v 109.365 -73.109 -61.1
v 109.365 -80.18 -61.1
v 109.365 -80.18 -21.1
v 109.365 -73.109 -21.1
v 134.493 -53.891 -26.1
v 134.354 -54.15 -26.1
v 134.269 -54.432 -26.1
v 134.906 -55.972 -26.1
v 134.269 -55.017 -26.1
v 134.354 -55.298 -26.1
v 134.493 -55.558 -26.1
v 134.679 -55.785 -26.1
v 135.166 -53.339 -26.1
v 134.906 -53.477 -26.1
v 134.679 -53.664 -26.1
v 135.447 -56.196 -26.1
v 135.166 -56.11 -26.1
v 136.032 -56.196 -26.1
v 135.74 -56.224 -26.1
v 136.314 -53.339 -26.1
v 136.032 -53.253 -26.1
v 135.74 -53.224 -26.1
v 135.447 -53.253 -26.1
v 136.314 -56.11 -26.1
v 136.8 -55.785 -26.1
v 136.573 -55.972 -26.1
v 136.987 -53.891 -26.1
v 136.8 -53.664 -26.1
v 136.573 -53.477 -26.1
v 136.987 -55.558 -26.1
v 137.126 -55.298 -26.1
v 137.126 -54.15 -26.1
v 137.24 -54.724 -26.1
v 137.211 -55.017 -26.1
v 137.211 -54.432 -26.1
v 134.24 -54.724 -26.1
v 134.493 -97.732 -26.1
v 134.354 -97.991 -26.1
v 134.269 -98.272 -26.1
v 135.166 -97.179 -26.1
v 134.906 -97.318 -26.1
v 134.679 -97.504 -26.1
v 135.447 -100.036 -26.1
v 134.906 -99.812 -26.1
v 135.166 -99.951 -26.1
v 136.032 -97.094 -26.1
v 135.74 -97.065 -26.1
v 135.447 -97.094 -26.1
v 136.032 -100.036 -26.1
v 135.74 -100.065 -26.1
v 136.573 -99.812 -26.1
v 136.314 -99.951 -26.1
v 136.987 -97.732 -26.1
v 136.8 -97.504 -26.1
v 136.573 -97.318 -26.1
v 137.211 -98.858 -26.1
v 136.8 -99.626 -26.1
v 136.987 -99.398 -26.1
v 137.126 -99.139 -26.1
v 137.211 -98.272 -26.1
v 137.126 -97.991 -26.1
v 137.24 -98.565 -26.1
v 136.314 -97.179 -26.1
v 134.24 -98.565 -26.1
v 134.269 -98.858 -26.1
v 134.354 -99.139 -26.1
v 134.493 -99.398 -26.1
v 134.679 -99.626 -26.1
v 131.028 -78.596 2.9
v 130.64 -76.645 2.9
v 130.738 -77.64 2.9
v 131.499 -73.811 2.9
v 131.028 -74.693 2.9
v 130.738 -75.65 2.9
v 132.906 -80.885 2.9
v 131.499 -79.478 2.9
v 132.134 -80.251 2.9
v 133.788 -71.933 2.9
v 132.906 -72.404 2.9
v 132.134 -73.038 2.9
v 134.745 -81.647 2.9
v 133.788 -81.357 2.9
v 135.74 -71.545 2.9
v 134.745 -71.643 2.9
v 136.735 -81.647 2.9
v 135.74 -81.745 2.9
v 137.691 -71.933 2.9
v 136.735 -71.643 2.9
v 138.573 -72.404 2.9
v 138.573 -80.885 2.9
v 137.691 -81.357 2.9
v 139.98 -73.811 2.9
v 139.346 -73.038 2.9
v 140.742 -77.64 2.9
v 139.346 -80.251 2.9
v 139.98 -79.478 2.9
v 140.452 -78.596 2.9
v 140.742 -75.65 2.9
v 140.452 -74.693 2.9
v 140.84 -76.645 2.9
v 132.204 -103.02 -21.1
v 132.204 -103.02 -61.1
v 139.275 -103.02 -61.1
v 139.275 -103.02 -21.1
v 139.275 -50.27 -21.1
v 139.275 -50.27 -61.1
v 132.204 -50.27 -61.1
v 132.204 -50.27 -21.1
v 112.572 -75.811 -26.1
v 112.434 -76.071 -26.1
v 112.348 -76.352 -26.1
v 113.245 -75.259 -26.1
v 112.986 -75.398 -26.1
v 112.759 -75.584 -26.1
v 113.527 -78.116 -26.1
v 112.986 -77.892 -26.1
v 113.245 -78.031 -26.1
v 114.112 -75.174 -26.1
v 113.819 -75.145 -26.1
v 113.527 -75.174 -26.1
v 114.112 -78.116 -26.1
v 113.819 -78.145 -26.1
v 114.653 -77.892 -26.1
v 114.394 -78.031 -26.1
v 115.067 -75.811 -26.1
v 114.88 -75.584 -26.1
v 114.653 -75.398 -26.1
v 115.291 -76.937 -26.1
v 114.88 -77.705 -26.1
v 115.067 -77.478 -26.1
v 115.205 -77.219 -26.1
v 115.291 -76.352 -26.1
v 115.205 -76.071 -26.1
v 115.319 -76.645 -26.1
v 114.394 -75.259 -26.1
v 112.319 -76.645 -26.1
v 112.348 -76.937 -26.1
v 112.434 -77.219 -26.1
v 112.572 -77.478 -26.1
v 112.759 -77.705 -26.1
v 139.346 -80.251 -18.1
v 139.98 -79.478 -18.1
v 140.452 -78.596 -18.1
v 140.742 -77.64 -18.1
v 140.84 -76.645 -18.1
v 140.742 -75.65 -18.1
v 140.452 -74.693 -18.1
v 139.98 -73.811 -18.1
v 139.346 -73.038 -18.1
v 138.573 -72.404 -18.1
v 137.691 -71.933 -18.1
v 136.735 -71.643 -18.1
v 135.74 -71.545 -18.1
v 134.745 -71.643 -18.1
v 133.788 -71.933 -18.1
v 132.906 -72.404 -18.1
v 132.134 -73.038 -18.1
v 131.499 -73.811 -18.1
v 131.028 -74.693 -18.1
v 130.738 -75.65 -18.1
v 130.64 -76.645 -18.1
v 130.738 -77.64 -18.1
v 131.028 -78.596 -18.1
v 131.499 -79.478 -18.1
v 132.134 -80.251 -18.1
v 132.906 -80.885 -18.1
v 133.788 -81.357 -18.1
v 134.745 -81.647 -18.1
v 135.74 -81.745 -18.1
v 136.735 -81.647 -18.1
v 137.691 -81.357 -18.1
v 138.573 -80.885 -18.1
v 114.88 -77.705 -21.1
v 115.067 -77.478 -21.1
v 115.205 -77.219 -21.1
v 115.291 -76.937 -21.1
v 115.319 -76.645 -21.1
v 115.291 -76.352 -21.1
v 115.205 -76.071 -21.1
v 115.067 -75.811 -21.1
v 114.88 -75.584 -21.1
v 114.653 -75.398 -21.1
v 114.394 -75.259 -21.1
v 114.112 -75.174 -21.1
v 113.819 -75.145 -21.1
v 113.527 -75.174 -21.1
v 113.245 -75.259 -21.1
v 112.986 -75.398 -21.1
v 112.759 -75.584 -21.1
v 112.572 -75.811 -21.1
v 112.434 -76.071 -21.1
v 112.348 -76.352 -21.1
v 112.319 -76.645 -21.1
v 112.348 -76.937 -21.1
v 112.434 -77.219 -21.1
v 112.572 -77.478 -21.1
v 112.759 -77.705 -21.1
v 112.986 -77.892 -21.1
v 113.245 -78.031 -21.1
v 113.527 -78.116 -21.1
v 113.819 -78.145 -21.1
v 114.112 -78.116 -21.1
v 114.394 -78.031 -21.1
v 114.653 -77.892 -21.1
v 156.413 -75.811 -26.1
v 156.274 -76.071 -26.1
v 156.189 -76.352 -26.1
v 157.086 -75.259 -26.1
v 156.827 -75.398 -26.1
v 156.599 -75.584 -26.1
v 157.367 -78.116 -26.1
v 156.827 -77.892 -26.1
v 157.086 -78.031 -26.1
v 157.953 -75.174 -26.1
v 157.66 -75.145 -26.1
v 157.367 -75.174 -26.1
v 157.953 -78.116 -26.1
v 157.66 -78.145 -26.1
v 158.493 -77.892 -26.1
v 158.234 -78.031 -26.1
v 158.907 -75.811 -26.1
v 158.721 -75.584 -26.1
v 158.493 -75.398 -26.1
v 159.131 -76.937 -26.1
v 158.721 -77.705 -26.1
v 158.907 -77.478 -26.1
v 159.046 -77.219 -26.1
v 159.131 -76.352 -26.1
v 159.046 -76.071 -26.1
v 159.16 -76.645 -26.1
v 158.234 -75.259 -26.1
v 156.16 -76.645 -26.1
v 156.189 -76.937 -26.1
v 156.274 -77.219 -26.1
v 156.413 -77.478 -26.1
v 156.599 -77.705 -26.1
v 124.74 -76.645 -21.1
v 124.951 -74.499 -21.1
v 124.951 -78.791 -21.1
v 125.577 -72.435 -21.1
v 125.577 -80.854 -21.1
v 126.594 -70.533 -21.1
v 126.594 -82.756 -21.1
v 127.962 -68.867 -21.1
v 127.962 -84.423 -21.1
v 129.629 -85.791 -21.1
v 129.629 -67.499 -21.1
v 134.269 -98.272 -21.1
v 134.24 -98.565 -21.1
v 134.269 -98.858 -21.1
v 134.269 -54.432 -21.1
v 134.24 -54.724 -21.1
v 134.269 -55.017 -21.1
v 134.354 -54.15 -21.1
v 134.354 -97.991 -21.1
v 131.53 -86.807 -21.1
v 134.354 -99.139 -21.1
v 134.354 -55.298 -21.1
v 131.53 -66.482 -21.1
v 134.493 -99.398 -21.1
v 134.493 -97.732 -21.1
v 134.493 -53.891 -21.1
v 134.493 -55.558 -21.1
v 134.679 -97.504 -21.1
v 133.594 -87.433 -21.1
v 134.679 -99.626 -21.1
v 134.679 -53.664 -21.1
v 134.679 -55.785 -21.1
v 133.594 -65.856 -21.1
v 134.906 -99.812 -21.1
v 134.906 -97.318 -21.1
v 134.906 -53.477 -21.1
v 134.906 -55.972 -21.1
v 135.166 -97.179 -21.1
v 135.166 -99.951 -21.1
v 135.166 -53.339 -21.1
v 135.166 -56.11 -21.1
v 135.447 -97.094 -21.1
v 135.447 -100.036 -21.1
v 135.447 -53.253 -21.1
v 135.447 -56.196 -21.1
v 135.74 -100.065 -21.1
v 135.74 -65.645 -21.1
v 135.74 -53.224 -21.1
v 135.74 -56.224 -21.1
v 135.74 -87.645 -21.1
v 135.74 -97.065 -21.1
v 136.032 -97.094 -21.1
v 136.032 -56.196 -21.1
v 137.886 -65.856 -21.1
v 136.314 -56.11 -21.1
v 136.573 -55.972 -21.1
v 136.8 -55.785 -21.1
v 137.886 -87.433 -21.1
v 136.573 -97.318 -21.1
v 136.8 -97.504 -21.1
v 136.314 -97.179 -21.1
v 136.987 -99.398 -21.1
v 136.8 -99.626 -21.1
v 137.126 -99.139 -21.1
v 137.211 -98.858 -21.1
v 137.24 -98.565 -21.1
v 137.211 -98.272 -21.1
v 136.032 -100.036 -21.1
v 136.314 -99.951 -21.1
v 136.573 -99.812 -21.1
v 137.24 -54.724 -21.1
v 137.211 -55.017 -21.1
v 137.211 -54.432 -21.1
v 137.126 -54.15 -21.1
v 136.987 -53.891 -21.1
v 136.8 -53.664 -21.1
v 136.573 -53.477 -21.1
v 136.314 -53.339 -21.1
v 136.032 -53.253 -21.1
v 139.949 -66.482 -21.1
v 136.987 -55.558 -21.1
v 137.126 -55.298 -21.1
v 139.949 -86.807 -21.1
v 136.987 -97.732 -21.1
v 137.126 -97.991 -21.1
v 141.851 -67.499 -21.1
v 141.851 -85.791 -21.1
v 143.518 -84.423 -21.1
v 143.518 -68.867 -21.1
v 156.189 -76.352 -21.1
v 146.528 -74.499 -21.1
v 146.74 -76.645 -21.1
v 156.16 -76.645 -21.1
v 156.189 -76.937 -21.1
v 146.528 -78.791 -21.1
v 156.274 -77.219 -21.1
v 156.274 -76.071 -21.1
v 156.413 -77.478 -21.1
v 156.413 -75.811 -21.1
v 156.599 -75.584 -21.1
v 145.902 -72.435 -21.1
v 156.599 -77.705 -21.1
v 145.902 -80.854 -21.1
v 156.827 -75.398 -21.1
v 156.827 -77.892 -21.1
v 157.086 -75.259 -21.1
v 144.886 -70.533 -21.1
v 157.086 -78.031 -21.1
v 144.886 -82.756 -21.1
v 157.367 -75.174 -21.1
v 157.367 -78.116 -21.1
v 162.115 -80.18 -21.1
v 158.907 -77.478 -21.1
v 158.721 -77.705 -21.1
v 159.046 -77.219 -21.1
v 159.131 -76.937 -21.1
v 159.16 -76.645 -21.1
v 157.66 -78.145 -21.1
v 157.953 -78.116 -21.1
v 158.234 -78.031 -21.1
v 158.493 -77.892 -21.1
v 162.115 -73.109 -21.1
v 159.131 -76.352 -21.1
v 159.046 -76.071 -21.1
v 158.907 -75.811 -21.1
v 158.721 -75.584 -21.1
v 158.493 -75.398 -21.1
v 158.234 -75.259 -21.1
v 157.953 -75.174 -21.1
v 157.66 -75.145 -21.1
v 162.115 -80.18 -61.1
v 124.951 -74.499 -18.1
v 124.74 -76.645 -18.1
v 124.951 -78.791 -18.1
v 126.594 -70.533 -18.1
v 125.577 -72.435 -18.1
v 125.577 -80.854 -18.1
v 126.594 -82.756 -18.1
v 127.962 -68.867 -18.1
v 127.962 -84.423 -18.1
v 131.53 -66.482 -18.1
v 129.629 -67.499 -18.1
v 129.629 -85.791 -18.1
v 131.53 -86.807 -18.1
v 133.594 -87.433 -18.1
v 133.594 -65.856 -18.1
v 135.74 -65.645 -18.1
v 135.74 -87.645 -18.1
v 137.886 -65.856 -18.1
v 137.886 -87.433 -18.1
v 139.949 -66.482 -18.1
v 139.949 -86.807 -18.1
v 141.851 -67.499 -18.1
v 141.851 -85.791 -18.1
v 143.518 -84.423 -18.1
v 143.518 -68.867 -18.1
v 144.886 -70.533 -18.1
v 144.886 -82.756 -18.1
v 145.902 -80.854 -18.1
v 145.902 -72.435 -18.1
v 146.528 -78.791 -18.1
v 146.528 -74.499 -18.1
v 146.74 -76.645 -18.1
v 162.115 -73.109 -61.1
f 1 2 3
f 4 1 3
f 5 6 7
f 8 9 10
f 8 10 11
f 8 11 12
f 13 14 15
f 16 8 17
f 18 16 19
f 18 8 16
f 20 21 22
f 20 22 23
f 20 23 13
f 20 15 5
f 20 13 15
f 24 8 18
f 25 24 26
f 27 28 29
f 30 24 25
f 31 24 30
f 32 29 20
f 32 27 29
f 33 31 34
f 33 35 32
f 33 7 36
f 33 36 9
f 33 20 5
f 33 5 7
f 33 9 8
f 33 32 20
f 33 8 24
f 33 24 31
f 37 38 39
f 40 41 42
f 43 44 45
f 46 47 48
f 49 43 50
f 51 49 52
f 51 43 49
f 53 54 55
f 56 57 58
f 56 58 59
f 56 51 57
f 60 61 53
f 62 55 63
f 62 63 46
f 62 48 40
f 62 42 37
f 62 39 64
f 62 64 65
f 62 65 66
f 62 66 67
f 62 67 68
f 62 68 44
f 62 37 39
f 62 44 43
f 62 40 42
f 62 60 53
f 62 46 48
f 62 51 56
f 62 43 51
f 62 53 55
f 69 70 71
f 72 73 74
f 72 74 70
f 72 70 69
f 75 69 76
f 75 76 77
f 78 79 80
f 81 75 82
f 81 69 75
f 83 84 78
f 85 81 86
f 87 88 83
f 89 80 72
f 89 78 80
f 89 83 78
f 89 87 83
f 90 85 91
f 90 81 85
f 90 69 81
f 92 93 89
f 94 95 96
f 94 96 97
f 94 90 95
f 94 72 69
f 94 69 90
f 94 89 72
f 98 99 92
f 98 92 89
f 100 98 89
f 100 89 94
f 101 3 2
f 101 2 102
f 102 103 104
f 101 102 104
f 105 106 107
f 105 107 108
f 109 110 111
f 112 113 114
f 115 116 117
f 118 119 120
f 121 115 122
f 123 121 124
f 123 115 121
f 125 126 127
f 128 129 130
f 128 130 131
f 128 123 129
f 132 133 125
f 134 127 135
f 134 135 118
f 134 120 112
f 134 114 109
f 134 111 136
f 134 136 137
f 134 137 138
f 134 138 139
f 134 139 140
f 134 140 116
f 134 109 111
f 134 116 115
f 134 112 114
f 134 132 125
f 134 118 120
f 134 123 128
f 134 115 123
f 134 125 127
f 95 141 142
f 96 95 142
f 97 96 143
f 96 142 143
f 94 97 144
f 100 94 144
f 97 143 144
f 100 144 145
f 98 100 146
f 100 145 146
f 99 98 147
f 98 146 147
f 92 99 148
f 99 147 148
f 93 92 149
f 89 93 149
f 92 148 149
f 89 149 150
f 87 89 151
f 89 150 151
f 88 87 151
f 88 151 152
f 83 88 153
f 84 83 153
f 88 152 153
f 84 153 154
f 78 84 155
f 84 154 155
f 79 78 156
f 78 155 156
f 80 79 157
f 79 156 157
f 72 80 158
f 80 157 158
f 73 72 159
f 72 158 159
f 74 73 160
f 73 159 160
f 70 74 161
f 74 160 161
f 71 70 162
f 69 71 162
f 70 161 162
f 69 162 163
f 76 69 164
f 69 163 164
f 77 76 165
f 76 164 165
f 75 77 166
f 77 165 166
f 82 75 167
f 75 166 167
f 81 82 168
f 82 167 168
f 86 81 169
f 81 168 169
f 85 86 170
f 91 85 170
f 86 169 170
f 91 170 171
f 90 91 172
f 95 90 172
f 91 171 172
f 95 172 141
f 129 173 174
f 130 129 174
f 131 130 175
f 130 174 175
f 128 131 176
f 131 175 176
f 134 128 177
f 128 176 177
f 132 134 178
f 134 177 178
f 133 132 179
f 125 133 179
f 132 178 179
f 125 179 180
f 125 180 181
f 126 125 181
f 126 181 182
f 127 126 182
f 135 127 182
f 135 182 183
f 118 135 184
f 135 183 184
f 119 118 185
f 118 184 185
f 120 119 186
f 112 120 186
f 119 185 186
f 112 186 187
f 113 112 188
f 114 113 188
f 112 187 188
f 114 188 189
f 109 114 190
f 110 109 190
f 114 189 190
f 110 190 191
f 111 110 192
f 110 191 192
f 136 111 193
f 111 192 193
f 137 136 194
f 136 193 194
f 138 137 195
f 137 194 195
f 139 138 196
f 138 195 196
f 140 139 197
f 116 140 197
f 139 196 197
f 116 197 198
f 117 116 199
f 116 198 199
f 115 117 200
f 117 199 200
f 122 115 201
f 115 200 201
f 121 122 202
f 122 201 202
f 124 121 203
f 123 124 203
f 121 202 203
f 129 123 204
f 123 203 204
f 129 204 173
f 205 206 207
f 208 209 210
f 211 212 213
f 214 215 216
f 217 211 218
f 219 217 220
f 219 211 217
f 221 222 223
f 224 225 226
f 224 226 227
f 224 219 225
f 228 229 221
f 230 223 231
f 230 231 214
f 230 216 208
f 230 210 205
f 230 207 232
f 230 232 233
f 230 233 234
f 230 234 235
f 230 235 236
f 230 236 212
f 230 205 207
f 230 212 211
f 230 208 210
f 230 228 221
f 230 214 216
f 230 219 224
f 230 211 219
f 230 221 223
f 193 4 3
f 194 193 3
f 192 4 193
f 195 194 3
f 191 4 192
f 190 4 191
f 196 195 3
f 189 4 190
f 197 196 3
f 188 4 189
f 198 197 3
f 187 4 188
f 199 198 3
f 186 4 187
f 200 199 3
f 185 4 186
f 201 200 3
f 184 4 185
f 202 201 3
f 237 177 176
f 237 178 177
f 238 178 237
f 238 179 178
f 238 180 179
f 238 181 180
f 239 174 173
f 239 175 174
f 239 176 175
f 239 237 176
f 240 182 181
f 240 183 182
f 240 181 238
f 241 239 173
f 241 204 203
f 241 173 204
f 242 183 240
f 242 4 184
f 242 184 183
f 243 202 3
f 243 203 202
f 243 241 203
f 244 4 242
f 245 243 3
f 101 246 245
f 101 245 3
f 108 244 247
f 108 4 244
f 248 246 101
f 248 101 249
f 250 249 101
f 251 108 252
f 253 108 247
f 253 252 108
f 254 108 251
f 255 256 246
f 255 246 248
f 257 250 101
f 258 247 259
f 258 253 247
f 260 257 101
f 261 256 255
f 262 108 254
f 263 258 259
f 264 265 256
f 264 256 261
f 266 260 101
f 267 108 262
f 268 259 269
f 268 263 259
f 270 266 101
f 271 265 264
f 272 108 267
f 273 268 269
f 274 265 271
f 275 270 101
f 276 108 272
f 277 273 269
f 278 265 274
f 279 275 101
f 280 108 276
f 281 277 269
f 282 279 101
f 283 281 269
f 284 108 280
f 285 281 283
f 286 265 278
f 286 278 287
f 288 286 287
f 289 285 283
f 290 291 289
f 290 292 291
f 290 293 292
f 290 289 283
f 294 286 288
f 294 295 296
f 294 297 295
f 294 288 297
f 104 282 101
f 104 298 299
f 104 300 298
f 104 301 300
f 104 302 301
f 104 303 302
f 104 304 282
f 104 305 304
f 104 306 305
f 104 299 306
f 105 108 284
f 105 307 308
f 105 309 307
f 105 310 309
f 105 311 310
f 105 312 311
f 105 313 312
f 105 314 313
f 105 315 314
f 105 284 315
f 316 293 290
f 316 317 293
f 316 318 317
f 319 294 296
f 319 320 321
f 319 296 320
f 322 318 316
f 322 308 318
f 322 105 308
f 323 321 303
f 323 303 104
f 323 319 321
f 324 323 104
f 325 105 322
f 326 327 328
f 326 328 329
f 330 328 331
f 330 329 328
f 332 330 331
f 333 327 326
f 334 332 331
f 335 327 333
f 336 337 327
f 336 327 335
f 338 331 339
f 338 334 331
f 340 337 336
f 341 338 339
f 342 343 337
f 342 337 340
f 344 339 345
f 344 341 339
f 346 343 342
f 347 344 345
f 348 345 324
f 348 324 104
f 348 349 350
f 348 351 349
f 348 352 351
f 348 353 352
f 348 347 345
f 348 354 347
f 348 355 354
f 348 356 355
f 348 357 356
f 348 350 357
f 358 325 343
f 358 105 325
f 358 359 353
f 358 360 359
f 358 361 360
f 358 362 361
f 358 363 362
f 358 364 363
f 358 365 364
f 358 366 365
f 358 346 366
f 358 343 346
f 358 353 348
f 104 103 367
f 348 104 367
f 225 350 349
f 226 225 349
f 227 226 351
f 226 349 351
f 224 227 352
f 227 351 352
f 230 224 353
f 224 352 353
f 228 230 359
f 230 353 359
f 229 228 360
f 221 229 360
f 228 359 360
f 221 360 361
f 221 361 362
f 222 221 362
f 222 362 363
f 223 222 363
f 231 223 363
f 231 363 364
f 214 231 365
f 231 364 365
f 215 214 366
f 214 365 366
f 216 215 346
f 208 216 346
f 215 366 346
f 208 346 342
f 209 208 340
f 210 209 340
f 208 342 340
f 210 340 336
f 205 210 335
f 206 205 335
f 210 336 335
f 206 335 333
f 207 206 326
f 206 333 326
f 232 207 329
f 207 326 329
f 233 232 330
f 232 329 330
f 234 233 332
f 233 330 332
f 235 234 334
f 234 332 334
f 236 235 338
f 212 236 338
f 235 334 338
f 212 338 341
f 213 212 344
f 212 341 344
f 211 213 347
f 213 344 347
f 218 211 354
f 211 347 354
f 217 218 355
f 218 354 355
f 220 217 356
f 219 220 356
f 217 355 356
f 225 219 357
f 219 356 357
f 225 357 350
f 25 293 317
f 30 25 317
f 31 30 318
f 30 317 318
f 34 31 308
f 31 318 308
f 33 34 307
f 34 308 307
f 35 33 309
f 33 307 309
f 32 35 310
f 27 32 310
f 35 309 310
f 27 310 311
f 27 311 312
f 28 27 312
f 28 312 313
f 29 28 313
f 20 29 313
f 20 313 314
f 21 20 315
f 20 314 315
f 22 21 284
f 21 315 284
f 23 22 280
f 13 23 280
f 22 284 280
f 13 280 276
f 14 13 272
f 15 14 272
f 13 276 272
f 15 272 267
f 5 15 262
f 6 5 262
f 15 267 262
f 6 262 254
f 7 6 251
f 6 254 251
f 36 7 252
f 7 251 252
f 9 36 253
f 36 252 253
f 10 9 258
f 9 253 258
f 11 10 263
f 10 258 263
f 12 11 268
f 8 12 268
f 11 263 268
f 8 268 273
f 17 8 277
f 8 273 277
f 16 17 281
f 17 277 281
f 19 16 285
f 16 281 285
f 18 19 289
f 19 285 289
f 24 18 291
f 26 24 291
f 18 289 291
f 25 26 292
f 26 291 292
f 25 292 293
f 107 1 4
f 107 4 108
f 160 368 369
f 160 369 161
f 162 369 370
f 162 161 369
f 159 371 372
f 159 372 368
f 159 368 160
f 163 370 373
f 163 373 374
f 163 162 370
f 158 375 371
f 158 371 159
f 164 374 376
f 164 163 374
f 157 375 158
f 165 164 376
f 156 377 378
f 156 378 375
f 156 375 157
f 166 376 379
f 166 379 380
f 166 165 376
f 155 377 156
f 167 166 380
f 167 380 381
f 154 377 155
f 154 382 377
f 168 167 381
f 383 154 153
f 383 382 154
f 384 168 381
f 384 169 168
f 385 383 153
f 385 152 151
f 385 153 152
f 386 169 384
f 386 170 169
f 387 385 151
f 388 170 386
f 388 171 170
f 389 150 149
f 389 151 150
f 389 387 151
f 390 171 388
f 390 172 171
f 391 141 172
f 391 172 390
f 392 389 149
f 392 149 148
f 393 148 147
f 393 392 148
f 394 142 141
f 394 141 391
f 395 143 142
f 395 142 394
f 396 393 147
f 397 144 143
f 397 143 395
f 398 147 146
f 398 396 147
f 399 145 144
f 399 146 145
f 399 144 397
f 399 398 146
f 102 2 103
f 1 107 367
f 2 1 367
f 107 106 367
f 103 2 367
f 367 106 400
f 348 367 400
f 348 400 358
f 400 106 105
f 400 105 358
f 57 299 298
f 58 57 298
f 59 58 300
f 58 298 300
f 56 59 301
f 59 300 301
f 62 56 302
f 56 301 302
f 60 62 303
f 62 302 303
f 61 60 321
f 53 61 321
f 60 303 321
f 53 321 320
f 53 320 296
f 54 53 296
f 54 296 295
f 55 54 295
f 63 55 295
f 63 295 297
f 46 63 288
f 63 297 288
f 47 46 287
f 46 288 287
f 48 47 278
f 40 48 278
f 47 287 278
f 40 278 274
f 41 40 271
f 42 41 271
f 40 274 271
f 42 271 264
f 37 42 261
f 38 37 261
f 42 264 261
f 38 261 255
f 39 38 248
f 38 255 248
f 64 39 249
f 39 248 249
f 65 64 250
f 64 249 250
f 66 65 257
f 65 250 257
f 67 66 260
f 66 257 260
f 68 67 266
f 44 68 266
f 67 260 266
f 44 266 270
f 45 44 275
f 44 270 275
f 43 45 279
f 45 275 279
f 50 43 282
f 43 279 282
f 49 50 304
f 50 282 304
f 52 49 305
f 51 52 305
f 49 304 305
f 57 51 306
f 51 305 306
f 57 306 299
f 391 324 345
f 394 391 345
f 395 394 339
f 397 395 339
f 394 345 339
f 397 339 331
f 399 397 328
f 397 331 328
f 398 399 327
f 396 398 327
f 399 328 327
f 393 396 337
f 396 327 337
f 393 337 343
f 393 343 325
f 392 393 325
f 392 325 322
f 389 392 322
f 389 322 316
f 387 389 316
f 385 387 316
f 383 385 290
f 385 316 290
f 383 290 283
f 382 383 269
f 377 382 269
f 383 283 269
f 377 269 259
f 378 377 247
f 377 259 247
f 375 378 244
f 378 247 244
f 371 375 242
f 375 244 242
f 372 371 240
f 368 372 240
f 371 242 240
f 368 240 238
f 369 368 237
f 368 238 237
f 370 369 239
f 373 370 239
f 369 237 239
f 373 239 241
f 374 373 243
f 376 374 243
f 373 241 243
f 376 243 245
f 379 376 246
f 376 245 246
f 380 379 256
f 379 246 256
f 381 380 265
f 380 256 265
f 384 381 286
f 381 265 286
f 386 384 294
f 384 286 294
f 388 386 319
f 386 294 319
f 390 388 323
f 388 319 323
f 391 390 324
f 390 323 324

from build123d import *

# Parameters (mm, degrees)
SKETCH018_W             = 42.3
SKETCH018_H             = 42.3
PAD005_DEPTH            = 40
SKETCH019_R             = 11
PAD006_DEPTH            = 3
SKETCH020_R             = 5.1
PAD007_DEPTH            = 21
SKETCH022_R             = 1.5
POCKET011_DEPTH         = 5
CHAMFER001_SIZE         = 5
BODY006_PLACEMENT_ANGLE = 45


with BuildPart() as part:
    # Sketch018 → Pad005 (new body)
    with BuildSketch(Plane.XY):
        Rectangle(SKETCH018_W, SKETCH018_H)
    extrude(amount=PAD005_DEPTH)

    # Sketch019 (on Face6 of Pad005) → Pad006 (join)
    with BuildSketch(Plane.XY.offset(40)):
        Circle(SKETCH019_R)
    extrude(amount=PAD006_DEPTH)

    # Sketch020 (on Face8 of Pad006) → Pad007 (join)
    with BuildSketch(Plane.XY.offset(43)):
        Circle(SKETCH020_R)
    extrude(amount=PAD007_DEPTH)

    # Sketch022 (on Face5 of Pad007) → Pocket011 (cut)
    with BuildSketch(Plane.XY.offset(40)):
        with Locations((-15.5, 15.5)):
            Circle(SKETCH022_R)
        with Locations((15.5, 15.5)):
            Circle(SKETCH022_R)
        with Locations((15.5, -15.5)):
            Circle(SKETCH022_R)
        with Locations((-15.5, -15.5)):
            Circle(SKETCH022_R)
    extrude(amount=-POCKET011_DEPTH, mode=Mode.SUBTRACT)

    # Chamfer001
    chamfer001_edges = [part.edges().sort_by_distance(p)[0] for p in [
        (21.15, 21.15, 20),
        (21.15, -21.15, 20),
        (-21.15, 21.15, 20),
        (-21.15, -21.15, 20),
    ]]
    chamfer(chamfer001_edges, length=CHAMFER001_SIZE)


with BuildPart() as part_1:
    # Body006 placement: moved
    add(part.part.moved(Location((135.7398047638, -76.644724306, -61.1))).rotate(Axis((135.7398047638, -76.644724306, -61.1), (0, 0, -1)), BODY006_PLACEMENT_ANGLE))


solid = part_1.part
